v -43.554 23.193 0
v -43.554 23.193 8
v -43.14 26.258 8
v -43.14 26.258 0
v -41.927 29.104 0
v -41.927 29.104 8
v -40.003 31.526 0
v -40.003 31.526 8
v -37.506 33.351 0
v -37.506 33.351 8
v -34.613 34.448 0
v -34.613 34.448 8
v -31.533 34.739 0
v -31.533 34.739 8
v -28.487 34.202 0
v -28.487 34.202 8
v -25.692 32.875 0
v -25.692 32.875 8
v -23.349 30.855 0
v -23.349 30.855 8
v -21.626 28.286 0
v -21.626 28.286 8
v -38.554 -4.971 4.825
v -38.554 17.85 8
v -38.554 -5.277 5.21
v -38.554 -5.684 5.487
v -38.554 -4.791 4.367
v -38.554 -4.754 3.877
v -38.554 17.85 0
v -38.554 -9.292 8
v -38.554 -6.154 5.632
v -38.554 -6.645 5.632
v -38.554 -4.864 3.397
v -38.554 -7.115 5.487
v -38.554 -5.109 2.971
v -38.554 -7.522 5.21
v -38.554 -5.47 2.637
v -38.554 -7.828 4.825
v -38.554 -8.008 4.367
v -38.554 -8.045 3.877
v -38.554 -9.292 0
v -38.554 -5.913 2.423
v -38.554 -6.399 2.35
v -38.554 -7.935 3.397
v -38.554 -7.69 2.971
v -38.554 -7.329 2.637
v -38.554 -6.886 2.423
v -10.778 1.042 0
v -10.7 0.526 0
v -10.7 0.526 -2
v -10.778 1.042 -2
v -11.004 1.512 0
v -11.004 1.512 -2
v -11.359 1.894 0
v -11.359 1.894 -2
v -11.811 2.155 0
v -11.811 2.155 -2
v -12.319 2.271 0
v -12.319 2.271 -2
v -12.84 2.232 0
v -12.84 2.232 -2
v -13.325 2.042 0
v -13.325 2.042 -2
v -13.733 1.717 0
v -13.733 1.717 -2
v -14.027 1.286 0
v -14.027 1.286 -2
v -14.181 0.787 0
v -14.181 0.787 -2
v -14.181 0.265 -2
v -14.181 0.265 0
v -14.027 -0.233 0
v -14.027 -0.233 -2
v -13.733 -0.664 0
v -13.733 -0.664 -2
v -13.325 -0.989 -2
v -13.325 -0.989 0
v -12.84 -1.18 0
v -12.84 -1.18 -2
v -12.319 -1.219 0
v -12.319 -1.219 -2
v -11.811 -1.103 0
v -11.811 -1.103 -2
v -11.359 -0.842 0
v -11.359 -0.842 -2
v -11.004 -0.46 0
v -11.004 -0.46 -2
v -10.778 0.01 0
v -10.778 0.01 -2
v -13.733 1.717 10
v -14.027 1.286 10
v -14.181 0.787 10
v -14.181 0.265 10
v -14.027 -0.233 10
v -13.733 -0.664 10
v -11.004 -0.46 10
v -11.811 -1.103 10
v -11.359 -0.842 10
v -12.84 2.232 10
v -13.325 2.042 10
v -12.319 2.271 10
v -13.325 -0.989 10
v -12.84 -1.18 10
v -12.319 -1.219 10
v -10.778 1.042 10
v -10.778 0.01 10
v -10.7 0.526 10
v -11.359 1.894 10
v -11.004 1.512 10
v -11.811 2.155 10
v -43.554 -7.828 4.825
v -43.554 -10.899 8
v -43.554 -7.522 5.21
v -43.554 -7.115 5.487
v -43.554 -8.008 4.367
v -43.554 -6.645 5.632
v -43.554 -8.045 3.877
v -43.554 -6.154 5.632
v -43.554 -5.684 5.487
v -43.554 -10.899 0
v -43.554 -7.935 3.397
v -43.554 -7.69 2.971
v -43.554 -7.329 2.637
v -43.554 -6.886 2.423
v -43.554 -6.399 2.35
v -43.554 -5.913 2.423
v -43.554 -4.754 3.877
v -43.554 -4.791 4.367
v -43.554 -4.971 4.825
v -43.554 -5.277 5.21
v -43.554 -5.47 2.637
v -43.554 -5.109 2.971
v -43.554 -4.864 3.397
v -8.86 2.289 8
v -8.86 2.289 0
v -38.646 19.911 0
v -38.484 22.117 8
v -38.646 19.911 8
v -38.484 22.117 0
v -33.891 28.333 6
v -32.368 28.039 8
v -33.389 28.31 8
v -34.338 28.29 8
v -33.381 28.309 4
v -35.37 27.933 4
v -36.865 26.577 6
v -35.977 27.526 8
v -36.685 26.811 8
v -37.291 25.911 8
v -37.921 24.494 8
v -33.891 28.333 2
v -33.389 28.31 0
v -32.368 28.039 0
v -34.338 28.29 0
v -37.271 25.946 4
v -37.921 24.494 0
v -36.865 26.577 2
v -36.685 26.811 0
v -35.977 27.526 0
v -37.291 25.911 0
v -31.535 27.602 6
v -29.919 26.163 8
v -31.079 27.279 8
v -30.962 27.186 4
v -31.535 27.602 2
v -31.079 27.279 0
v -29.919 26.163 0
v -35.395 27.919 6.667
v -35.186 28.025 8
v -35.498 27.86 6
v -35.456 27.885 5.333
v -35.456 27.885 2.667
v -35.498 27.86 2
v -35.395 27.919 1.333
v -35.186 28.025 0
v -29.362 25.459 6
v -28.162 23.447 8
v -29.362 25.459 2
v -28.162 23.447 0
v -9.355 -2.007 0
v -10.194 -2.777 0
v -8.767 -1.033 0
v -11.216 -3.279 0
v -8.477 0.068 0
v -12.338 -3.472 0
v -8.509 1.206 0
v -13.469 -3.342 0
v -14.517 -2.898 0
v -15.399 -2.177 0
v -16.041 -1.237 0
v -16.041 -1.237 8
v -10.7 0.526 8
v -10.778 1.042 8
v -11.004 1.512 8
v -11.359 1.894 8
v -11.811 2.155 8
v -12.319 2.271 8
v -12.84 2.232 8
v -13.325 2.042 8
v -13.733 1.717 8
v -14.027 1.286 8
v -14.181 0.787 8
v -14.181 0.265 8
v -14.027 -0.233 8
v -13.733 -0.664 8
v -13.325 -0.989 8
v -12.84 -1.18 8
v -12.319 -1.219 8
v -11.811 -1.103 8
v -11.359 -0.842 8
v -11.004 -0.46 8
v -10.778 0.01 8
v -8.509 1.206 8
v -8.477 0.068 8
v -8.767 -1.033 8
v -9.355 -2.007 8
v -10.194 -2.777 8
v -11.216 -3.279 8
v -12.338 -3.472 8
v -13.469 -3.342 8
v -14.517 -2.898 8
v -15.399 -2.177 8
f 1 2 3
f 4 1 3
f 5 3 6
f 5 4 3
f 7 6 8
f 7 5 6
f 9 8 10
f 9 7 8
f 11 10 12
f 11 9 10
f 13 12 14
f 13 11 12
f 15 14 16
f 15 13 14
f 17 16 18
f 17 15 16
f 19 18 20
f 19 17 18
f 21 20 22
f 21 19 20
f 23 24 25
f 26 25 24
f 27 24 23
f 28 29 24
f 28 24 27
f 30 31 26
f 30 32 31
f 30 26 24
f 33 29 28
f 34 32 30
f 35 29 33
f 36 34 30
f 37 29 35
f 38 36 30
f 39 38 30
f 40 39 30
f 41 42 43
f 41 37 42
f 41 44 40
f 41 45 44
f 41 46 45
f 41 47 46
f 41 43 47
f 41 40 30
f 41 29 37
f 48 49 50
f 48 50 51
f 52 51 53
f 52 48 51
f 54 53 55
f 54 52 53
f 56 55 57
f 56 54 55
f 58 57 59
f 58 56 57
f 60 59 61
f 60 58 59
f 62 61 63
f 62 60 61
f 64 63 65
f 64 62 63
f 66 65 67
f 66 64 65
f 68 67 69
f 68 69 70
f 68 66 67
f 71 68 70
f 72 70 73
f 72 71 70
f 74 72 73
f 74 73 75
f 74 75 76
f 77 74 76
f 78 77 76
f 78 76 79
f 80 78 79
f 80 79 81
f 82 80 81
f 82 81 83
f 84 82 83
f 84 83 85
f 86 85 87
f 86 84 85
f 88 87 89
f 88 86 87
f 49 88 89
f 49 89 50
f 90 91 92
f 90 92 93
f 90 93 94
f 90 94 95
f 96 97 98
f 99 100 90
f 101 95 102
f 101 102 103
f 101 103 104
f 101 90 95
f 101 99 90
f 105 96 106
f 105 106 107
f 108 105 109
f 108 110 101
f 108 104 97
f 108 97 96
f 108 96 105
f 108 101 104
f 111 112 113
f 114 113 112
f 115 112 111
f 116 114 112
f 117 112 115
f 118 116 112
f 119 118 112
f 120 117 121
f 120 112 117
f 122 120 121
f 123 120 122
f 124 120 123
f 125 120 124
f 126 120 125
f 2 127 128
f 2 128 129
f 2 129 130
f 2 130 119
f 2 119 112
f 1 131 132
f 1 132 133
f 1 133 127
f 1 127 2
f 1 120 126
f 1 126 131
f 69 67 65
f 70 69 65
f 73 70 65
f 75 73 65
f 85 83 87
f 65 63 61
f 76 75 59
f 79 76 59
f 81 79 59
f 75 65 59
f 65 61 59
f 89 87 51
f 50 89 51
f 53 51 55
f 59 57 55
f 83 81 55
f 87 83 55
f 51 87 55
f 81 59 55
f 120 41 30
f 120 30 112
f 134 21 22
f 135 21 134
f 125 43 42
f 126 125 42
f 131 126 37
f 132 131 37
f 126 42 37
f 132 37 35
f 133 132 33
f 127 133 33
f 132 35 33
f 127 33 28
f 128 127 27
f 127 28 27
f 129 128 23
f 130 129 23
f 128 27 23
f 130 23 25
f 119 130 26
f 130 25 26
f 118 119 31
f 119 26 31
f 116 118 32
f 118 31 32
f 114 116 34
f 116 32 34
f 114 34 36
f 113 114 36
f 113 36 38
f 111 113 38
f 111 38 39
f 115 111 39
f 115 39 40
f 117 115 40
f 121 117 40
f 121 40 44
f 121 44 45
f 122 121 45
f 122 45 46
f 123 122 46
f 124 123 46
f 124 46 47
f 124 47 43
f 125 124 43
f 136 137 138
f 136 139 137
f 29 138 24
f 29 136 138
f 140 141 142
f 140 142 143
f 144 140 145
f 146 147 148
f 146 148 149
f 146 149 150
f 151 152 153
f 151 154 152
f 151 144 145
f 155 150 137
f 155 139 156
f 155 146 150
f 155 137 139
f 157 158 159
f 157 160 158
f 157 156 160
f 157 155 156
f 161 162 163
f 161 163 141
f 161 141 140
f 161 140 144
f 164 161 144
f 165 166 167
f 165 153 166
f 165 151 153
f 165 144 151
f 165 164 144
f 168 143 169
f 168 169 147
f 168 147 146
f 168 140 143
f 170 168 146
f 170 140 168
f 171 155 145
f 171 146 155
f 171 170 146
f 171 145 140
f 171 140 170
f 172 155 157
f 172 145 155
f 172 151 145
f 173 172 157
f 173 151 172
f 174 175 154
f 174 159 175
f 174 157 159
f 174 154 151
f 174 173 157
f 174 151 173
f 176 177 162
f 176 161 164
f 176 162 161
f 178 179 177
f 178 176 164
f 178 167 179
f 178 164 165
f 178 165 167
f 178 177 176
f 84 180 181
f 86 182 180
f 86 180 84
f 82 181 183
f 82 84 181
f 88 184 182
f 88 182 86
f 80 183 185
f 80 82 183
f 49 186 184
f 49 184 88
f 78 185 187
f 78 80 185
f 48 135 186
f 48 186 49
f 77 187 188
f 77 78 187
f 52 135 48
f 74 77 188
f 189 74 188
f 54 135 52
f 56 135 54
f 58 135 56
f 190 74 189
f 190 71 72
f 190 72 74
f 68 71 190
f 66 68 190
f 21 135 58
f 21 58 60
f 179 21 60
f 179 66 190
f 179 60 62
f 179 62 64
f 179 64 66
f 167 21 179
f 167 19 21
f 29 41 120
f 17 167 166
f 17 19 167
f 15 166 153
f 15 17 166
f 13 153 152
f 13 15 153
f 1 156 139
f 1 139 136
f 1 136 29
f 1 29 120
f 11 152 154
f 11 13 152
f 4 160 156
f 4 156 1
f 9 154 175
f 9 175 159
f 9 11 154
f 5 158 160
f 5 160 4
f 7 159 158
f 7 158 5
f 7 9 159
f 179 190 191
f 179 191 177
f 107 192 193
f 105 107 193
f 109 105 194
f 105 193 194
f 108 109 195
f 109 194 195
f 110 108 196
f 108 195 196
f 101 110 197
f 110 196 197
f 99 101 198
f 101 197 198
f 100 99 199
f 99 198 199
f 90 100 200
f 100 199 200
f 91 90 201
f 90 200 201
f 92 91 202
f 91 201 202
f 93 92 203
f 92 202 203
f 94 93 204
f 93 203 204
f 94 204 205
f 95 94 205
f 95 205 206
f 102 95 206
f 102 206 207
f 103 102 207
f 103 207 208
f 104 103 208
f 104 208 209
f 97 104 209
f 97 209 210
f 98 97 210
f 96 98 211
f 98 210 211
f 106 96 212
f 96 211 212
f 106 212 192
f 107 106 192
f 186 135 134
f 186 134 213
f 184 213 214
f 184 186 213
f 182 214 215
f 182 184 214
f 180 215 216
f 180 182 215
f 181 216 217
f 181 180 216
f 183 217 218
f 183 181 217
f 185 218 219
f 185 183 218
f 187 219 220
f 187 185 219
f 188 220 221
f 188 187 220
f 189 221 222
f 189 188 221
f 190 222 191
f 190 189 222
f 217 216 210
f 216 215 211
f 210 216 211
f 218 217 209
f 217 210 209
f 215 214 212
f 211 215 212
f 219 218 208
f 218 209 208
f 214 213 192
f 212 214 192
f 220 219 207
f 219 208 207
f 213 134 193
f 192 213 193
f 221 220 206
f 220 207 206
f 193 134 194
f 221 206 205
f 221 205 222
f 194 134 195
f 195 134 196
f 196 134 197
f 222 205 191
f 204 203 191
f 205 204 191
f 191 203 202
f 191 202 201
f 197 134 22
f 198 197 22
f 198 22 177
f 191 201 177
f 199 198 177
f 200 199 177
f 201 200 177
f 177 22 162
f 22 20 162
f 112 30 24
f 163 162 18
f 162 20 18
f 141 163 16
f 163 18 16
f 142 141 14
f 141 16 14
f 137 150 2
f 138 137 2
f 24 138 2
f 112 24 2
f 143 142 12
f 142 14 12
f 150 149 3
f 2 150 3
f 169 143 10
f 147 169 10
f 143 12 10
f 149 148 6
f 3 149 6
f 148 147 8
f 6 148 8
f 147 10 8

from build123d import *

# Parameters (mm, degrees)
SALIENTE_EXTRUIR1_DEPTH                        = 8
CROQUIS2_R                                     = 1.75
SALIENTE_EXTRUIR2_DEPTH                        = 2
PERFORADOR_PARA_ROSCAR_PARA_MACHO_DE_ROS_D     = 3.3
PERFORADOR_PARA_ROSCAR_PARA_MACHO_DE_ROS_DEPTH = 7
PERFORADOR_PARA_ROSCAR_PARA_MACHO_DE_ROS_TIP   = 0.991420021


with BuildPart() as part:
    # Croquis1 → Saliente-Extruir1 (new body)
    with BuildSketch(Plane.XY):
        with BuildLine():
            Line((-21.62608642, 28.286151185), (-8.859820947, 2.289392402))
            ThreePointArc((-8.859820947, 2.289392402), (-10.687098367, -3.064209864), (-16.040700634, -1.236932444))
            Line((-16.040700634, -1.236932444), (-28.162442293, 23.44734148))
            add(Edge.make_bspline(
                [(-28.162442293, 23.44734148), (-41.803068248, 51.224616152), (-38.554014675, 17.849905123)],
                knots=[2.065965679, 2.065965679, 2.065965679, 4.571411553, 4.571411553, 4.571411553], degree=2, weights=[1, 0.312737171, 1]))
            Line((-38.554014675, 17.849905123), (-38.554014675, -9.292104706))
            Line((-38.554014675, -9.292104706), (-43.554014675, -10.899488854))
            Line((-43.554014675, -10.899488854), (-43.554014675, 23.192572958))
            ThreePointArc((-43.554014675, 23.192572958), (-34.613059385, 34.4484445), (-21.62608642, 28.286151185))
        make_face()
    extrude(amount=SALIENTE_EXTRUIR1_DEPTH)

    # Croquis2 → Saliente-Extruir2 (add)
    with BuildSketch(Plane.XY.offset(8)):
        with Locations((-12.45026079, 0.526229979)):
            Circle(CROQUIS2_R)
    saliente_extruir2 = extrude(amount=SALIENTE_EXTRUIR2_DEPTH)

    # Simetría1: Saliente-Extruir2 across plane
    add(saliente_extruir2.mirror(Plane.XY.offset(4)))

    # Perforador para roscar para macho de roscar para M41
    with Locations(Plane.ZY.offset(43.554014675)):
        with Locations((4, -6.399488854)):
            Hole(PERFORADOR_PARA_ROSCAR_PARA_MACHO_DE_ROS_D / 2, depth=PERFORADOR_PARA_ROSCAR_PARA_MACHO_DE_ROS_DEPTH)
            with Locations((0, 0, -(PERFORADOR_PARA_ROSCAR_PARA_MACHO_DE_ROS_DEPTH + PERFORADOR_PARA_ROSCAR_PARA_MACHO_DE_ROS_TIP / 2))):  # 118° drill point
                Cone(0, PERFORADOR_PARA_ROSCAR_PARA_MACHO_DE_ROS_D / 2, PERFORADOR_PARA_ROSCAR_PARA_MACHO_DE_ROS_TIP, mode=Mode.SUBTRACT)


solid = part.part
